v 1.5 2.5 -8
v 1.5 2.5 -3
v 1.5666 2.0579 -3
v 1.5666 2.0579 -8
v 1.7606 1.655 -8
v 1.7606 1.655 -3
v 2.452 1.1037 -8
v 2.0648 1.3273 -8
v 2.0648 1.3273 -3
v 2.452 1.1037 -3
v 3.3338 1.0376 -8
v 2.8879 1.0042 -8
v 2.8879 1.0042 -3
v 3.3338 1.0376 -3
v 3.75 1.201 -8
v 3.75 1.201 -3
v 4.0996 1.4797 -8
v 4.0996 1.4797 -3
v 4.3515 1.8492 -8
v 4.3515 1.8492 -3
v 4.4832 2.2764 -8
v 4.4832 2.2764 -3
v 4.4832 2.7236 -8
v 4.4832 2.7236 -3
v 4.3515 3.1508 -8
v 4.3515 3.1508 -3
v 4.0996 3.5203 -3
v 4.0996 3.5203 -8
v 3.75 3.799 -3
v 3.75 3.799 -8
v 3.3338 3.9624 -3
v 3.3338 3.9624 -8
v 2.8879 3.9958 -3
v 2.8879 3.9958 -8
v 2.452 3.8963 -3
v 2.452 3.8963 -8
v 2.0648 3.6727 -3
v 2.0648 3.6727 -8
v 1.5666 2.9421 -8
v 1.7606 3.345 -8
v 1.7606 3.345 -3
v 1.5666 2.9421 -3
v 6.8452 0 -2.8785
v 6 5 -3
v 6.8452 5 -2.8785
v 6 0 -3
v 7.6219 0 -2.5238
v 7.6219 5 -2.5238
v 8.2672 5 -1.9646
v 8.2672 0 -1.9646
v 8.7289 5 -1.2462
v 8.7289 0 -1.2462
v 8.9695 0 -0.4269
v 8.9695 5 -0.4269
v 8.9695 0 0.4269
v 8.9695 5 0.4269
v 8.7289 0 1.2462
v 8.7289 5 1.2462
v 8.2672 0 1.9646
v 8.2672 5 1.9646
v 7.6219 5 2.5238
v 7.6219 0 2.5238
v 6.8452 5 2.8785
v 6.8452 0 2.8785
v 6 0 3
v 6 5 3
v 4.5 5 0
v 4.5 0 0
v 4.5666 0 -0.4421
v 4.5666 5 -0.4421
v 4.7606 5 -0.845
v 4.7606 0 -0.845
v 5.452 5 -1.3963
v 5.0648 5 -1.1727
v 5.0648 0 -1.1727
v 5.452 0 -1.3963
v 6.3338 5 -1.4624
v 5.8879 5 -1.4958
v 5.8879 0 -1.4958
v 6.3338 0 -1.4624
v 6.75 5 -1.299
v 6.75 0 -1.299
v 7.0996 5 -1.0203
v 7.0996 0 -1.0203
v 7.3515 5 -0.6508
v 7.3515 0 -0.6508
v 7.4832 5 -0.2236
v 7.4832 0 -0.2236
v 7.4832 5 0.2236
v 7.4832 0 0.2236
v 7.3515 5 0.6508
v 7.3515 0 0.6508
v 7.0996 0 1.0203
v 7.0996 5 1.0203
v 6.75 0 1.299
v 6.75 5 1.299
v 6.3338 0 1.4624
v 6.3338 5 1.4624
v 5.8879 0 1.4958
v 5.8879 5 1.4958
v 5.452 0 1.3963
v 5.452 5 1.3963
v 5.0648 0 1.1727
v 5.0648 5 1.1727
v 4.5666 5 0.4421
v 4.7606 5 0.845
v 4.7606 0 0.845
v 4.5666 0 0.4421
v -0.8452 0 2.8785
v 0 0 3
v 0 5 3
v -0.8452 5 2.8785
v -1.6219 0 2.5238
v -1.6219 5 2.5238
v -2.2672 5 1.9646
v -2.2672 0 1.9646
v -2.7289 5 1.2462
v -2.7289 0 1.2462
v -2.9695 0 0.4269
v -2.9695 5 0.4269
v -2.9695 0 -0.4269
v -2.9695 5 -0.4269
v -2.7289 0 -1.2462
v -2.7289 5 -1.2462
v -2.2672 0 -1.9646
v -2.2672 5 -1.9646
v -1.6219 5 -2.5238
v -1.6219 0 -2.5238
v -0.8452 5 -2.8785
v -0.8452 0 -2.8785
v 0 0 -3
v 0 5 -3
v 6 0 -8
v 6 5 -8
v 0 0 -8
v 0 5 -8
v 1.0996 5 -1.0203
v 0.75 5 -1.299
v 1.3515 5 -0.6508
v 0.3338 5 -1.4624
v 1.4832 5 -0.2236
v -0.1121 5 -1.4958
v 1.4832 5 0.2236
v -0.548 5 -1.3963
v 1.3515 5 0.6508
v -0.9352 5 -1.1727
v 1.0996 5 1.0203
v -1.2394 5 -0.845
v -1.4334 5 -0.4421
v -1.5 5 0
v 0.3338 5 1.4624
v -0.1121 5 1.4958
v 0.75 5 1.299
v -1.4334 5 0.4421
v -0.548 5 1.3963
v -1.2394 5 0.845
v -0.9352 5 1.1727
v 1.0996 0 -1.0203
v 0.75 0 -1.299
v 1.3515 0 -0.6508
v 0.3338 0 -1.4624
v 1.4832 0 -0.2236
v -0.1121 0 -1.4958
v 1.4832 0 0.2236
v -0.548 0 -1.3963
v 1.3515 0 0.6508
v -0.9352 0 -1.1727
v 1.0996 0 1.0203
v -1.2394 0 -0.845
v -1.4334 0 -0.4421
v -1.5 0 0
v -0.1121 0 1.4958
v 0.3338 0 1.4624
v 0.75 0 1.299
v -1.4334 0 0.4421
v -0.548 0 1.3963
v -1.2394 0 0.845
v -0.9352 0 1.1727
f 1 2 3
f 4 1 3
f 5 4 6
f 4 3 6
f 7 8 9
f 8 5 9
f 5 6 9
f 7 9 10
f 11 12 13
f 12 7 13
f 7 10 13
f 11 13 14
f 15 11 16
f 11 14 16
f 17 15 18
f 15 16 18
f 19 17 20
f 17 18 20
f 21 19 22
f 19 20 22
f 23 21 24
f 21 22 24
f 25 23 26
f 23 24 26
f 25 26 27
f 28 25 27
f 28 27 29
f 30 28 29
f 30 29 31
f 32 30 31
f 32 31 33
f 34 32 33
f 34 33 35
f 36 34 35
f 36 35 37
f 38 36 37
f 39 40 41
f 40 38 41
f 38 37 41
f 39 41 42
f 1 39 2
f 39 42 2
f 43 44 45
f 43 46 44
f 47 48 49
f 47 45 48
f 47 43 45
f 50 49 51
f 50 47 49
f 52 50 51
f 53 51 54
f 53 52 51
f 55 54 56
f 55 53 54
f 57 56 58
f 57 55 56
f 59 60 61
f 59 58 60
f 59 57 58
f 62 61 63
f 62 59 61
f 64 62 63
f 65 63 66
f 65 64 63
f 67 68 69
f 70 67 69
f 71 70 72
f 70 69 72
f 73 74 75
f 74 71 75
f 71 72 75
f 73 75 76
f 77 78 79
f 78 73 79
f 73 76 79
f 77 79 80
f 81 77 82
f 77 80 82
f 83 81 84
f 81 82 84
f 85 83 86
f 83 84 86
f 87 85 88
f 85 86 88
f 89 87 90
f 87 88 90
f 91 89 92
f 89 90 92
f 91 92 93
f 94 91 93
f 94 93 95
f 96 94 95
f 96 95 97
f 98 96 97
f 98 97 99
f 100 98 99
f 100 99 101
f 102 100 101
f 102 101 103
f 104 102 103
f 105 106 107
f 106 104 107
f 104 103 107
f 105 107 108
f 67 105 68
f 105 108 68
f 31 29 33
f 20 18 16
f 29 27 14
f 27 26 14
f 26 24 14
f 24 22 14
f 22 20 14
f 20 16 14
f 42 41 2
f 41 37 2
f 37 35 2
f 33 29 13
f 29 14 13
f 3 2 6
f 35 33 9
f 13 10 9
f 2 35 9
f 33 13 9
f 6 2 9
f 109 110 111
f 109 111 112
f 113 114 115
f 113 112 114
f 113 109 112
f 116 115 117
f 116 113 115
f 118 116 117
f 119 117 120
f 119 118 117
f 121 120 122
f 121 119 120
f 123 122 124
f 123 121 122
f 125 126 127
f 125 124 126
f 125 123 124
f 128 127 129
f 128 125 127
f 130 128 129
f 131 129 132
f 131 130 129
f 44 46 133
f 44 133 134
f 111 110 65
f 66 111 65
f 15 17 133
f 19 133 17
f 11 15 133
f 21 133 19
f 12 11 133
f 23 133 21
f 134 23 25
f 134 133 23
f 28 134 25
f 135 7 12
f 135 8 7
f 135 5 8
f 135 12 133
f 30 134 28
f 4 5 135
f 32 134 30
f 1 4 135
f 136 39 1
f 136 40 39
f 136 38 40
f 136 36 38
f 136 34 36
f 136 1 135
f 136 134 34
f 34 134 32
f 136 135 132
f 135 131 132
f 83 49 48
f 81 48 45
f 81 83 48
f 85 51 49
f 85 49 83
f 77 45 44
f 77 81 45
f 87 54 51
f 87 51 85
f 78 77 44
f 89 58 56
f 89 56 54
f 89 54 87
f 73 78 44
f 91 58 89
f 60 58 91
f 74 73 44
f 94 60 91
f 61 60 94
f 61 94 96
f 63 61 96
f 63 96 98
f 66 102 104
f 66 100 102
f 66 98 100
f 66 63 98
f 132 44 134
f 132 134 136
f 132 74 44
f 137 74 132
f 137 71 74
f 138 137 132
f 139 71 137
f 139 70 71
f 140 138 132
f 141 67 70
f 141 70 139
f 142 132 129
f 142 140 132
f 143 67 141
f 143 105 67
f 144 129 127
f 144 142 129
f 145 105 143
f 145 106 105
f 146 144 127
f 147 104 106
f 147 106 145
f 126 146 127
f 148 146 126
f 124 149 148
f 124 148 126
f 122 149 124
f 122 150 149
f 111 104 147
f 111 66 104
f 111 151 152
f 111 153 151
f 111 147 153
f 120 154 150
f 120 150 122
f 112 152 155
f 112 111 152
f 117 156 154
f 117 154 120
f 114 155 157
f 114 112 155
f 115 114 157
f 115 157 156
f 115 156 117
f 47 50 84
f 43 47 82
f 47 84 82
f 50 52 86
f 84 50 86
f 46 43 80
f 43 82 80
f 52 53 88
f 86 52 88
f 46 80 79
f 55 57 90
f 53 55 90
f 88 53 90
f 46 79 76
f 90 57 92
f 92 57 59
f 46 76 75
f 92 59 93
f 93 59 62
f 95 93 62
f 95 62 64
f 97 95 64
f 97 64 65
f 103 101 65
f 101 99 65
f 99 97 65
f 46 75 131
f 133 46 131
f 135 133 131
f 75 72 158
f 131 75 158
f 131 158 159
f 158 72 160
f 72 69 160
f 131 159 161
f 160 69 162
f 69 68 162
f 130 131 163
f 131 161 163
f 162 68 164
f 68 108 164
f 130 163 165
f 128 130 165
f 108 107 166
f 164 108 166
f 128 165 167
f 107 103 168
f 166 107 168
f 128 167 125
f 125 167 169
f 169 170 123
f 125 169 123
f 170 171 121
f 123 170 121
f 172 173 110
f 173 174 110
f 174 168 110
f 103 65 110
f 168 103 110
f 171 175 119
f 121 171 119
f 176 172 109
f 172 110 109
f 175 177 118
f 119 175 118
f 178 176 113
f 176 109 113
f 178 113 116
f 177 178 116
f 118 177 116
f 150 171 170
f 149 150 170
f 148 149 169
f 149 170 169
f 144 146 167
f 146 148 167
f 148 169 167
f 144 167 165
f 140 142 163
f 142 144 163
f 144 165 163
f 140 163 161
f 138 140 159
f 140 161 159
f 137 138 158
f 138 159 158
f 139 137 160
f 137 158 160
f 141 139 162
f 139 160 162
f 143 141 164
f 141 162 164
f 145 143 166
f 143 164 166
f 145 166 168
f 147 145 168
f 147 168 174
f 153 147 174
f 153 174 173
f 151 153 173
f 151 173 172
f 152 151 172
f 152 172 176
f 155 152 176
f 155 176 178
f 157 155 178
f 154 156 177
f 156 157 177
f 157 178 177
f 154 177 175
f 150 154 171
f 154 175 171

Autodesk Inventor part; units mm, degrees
ref_plane "YZ Plane" through (0, 0, 0) normal (1, 0, 0) x (0, 1, 0)
ref_plane "XZ Plane" through (0, 0, 0) normal (0, 1, 0) x (-1, 0, 0)
ref_plane "XY Plane" through (0, 0, 0) normal (0, 0, 1) x (1, 0, 0)
sketch "草图1" plane through (0, 0, 0) normal (0, 1, 0) x (-1, 0, 0)
  line L0 (0, 0) -> (-6, 0) construction
  line L1 (0, 3) -> (-6, 3)
  line L2 (-6, -3) -> (0, -3)
  arc A0 (0, -3) -> (0, 3) centre (0, 0) ccw
  arc A1 (-6, 3) -> (-6, -3) centre (-6, 0) ccw
  circle A2 centre (0, 0) radius 1.5
  circle A3 centre (-6, 0) radius 1.5
  point P0 (-3, 0)
  dimension "d0" = 6
  dimension "d1" = 3
  dimension "d2" = 3
  dimension "d3" = 1.5
extrude "拉伸1" add sketch "草图1" along normal blind 5
sketch "草图2" plane through (6, 0, -3) normal (0, 0, -1) x (-1, 0, 0)
  line L0 (0, 0) -> (6, 0) projected
  line L1 (6, 0) -> (6, 5) projected
  line L2 (0, 5) -> (6, 5) projected
  line L3 (0, 0) -> (0, 5) projected
  line L4 (0, 0) -> (6, 0)
  line L5 (6, 0) -> (6, 5)
  line L6 (6, 5) -> (0, 5)
  line L7 (0, 5) -> (0, 0)
  line L8 (0, 0) -> (6, 5) construction
  line L9 (6, 0) -> (0, 5) construction
  line L10 (0, 5) -> (6, 5) projected
  line L11 (6, 0) -> (6, 5) projected
  line L12 (0, 0) -> (6, 0) projected
  line L13 (0, 0) -> (0, 5) projected
  circle A0 centre (3, 2.5) radius 1.5
  dimension "d6" = 3
extrude "拉伸2" add sketch "草图2" along normal blind 5
properties part number "夹爪连接件"
